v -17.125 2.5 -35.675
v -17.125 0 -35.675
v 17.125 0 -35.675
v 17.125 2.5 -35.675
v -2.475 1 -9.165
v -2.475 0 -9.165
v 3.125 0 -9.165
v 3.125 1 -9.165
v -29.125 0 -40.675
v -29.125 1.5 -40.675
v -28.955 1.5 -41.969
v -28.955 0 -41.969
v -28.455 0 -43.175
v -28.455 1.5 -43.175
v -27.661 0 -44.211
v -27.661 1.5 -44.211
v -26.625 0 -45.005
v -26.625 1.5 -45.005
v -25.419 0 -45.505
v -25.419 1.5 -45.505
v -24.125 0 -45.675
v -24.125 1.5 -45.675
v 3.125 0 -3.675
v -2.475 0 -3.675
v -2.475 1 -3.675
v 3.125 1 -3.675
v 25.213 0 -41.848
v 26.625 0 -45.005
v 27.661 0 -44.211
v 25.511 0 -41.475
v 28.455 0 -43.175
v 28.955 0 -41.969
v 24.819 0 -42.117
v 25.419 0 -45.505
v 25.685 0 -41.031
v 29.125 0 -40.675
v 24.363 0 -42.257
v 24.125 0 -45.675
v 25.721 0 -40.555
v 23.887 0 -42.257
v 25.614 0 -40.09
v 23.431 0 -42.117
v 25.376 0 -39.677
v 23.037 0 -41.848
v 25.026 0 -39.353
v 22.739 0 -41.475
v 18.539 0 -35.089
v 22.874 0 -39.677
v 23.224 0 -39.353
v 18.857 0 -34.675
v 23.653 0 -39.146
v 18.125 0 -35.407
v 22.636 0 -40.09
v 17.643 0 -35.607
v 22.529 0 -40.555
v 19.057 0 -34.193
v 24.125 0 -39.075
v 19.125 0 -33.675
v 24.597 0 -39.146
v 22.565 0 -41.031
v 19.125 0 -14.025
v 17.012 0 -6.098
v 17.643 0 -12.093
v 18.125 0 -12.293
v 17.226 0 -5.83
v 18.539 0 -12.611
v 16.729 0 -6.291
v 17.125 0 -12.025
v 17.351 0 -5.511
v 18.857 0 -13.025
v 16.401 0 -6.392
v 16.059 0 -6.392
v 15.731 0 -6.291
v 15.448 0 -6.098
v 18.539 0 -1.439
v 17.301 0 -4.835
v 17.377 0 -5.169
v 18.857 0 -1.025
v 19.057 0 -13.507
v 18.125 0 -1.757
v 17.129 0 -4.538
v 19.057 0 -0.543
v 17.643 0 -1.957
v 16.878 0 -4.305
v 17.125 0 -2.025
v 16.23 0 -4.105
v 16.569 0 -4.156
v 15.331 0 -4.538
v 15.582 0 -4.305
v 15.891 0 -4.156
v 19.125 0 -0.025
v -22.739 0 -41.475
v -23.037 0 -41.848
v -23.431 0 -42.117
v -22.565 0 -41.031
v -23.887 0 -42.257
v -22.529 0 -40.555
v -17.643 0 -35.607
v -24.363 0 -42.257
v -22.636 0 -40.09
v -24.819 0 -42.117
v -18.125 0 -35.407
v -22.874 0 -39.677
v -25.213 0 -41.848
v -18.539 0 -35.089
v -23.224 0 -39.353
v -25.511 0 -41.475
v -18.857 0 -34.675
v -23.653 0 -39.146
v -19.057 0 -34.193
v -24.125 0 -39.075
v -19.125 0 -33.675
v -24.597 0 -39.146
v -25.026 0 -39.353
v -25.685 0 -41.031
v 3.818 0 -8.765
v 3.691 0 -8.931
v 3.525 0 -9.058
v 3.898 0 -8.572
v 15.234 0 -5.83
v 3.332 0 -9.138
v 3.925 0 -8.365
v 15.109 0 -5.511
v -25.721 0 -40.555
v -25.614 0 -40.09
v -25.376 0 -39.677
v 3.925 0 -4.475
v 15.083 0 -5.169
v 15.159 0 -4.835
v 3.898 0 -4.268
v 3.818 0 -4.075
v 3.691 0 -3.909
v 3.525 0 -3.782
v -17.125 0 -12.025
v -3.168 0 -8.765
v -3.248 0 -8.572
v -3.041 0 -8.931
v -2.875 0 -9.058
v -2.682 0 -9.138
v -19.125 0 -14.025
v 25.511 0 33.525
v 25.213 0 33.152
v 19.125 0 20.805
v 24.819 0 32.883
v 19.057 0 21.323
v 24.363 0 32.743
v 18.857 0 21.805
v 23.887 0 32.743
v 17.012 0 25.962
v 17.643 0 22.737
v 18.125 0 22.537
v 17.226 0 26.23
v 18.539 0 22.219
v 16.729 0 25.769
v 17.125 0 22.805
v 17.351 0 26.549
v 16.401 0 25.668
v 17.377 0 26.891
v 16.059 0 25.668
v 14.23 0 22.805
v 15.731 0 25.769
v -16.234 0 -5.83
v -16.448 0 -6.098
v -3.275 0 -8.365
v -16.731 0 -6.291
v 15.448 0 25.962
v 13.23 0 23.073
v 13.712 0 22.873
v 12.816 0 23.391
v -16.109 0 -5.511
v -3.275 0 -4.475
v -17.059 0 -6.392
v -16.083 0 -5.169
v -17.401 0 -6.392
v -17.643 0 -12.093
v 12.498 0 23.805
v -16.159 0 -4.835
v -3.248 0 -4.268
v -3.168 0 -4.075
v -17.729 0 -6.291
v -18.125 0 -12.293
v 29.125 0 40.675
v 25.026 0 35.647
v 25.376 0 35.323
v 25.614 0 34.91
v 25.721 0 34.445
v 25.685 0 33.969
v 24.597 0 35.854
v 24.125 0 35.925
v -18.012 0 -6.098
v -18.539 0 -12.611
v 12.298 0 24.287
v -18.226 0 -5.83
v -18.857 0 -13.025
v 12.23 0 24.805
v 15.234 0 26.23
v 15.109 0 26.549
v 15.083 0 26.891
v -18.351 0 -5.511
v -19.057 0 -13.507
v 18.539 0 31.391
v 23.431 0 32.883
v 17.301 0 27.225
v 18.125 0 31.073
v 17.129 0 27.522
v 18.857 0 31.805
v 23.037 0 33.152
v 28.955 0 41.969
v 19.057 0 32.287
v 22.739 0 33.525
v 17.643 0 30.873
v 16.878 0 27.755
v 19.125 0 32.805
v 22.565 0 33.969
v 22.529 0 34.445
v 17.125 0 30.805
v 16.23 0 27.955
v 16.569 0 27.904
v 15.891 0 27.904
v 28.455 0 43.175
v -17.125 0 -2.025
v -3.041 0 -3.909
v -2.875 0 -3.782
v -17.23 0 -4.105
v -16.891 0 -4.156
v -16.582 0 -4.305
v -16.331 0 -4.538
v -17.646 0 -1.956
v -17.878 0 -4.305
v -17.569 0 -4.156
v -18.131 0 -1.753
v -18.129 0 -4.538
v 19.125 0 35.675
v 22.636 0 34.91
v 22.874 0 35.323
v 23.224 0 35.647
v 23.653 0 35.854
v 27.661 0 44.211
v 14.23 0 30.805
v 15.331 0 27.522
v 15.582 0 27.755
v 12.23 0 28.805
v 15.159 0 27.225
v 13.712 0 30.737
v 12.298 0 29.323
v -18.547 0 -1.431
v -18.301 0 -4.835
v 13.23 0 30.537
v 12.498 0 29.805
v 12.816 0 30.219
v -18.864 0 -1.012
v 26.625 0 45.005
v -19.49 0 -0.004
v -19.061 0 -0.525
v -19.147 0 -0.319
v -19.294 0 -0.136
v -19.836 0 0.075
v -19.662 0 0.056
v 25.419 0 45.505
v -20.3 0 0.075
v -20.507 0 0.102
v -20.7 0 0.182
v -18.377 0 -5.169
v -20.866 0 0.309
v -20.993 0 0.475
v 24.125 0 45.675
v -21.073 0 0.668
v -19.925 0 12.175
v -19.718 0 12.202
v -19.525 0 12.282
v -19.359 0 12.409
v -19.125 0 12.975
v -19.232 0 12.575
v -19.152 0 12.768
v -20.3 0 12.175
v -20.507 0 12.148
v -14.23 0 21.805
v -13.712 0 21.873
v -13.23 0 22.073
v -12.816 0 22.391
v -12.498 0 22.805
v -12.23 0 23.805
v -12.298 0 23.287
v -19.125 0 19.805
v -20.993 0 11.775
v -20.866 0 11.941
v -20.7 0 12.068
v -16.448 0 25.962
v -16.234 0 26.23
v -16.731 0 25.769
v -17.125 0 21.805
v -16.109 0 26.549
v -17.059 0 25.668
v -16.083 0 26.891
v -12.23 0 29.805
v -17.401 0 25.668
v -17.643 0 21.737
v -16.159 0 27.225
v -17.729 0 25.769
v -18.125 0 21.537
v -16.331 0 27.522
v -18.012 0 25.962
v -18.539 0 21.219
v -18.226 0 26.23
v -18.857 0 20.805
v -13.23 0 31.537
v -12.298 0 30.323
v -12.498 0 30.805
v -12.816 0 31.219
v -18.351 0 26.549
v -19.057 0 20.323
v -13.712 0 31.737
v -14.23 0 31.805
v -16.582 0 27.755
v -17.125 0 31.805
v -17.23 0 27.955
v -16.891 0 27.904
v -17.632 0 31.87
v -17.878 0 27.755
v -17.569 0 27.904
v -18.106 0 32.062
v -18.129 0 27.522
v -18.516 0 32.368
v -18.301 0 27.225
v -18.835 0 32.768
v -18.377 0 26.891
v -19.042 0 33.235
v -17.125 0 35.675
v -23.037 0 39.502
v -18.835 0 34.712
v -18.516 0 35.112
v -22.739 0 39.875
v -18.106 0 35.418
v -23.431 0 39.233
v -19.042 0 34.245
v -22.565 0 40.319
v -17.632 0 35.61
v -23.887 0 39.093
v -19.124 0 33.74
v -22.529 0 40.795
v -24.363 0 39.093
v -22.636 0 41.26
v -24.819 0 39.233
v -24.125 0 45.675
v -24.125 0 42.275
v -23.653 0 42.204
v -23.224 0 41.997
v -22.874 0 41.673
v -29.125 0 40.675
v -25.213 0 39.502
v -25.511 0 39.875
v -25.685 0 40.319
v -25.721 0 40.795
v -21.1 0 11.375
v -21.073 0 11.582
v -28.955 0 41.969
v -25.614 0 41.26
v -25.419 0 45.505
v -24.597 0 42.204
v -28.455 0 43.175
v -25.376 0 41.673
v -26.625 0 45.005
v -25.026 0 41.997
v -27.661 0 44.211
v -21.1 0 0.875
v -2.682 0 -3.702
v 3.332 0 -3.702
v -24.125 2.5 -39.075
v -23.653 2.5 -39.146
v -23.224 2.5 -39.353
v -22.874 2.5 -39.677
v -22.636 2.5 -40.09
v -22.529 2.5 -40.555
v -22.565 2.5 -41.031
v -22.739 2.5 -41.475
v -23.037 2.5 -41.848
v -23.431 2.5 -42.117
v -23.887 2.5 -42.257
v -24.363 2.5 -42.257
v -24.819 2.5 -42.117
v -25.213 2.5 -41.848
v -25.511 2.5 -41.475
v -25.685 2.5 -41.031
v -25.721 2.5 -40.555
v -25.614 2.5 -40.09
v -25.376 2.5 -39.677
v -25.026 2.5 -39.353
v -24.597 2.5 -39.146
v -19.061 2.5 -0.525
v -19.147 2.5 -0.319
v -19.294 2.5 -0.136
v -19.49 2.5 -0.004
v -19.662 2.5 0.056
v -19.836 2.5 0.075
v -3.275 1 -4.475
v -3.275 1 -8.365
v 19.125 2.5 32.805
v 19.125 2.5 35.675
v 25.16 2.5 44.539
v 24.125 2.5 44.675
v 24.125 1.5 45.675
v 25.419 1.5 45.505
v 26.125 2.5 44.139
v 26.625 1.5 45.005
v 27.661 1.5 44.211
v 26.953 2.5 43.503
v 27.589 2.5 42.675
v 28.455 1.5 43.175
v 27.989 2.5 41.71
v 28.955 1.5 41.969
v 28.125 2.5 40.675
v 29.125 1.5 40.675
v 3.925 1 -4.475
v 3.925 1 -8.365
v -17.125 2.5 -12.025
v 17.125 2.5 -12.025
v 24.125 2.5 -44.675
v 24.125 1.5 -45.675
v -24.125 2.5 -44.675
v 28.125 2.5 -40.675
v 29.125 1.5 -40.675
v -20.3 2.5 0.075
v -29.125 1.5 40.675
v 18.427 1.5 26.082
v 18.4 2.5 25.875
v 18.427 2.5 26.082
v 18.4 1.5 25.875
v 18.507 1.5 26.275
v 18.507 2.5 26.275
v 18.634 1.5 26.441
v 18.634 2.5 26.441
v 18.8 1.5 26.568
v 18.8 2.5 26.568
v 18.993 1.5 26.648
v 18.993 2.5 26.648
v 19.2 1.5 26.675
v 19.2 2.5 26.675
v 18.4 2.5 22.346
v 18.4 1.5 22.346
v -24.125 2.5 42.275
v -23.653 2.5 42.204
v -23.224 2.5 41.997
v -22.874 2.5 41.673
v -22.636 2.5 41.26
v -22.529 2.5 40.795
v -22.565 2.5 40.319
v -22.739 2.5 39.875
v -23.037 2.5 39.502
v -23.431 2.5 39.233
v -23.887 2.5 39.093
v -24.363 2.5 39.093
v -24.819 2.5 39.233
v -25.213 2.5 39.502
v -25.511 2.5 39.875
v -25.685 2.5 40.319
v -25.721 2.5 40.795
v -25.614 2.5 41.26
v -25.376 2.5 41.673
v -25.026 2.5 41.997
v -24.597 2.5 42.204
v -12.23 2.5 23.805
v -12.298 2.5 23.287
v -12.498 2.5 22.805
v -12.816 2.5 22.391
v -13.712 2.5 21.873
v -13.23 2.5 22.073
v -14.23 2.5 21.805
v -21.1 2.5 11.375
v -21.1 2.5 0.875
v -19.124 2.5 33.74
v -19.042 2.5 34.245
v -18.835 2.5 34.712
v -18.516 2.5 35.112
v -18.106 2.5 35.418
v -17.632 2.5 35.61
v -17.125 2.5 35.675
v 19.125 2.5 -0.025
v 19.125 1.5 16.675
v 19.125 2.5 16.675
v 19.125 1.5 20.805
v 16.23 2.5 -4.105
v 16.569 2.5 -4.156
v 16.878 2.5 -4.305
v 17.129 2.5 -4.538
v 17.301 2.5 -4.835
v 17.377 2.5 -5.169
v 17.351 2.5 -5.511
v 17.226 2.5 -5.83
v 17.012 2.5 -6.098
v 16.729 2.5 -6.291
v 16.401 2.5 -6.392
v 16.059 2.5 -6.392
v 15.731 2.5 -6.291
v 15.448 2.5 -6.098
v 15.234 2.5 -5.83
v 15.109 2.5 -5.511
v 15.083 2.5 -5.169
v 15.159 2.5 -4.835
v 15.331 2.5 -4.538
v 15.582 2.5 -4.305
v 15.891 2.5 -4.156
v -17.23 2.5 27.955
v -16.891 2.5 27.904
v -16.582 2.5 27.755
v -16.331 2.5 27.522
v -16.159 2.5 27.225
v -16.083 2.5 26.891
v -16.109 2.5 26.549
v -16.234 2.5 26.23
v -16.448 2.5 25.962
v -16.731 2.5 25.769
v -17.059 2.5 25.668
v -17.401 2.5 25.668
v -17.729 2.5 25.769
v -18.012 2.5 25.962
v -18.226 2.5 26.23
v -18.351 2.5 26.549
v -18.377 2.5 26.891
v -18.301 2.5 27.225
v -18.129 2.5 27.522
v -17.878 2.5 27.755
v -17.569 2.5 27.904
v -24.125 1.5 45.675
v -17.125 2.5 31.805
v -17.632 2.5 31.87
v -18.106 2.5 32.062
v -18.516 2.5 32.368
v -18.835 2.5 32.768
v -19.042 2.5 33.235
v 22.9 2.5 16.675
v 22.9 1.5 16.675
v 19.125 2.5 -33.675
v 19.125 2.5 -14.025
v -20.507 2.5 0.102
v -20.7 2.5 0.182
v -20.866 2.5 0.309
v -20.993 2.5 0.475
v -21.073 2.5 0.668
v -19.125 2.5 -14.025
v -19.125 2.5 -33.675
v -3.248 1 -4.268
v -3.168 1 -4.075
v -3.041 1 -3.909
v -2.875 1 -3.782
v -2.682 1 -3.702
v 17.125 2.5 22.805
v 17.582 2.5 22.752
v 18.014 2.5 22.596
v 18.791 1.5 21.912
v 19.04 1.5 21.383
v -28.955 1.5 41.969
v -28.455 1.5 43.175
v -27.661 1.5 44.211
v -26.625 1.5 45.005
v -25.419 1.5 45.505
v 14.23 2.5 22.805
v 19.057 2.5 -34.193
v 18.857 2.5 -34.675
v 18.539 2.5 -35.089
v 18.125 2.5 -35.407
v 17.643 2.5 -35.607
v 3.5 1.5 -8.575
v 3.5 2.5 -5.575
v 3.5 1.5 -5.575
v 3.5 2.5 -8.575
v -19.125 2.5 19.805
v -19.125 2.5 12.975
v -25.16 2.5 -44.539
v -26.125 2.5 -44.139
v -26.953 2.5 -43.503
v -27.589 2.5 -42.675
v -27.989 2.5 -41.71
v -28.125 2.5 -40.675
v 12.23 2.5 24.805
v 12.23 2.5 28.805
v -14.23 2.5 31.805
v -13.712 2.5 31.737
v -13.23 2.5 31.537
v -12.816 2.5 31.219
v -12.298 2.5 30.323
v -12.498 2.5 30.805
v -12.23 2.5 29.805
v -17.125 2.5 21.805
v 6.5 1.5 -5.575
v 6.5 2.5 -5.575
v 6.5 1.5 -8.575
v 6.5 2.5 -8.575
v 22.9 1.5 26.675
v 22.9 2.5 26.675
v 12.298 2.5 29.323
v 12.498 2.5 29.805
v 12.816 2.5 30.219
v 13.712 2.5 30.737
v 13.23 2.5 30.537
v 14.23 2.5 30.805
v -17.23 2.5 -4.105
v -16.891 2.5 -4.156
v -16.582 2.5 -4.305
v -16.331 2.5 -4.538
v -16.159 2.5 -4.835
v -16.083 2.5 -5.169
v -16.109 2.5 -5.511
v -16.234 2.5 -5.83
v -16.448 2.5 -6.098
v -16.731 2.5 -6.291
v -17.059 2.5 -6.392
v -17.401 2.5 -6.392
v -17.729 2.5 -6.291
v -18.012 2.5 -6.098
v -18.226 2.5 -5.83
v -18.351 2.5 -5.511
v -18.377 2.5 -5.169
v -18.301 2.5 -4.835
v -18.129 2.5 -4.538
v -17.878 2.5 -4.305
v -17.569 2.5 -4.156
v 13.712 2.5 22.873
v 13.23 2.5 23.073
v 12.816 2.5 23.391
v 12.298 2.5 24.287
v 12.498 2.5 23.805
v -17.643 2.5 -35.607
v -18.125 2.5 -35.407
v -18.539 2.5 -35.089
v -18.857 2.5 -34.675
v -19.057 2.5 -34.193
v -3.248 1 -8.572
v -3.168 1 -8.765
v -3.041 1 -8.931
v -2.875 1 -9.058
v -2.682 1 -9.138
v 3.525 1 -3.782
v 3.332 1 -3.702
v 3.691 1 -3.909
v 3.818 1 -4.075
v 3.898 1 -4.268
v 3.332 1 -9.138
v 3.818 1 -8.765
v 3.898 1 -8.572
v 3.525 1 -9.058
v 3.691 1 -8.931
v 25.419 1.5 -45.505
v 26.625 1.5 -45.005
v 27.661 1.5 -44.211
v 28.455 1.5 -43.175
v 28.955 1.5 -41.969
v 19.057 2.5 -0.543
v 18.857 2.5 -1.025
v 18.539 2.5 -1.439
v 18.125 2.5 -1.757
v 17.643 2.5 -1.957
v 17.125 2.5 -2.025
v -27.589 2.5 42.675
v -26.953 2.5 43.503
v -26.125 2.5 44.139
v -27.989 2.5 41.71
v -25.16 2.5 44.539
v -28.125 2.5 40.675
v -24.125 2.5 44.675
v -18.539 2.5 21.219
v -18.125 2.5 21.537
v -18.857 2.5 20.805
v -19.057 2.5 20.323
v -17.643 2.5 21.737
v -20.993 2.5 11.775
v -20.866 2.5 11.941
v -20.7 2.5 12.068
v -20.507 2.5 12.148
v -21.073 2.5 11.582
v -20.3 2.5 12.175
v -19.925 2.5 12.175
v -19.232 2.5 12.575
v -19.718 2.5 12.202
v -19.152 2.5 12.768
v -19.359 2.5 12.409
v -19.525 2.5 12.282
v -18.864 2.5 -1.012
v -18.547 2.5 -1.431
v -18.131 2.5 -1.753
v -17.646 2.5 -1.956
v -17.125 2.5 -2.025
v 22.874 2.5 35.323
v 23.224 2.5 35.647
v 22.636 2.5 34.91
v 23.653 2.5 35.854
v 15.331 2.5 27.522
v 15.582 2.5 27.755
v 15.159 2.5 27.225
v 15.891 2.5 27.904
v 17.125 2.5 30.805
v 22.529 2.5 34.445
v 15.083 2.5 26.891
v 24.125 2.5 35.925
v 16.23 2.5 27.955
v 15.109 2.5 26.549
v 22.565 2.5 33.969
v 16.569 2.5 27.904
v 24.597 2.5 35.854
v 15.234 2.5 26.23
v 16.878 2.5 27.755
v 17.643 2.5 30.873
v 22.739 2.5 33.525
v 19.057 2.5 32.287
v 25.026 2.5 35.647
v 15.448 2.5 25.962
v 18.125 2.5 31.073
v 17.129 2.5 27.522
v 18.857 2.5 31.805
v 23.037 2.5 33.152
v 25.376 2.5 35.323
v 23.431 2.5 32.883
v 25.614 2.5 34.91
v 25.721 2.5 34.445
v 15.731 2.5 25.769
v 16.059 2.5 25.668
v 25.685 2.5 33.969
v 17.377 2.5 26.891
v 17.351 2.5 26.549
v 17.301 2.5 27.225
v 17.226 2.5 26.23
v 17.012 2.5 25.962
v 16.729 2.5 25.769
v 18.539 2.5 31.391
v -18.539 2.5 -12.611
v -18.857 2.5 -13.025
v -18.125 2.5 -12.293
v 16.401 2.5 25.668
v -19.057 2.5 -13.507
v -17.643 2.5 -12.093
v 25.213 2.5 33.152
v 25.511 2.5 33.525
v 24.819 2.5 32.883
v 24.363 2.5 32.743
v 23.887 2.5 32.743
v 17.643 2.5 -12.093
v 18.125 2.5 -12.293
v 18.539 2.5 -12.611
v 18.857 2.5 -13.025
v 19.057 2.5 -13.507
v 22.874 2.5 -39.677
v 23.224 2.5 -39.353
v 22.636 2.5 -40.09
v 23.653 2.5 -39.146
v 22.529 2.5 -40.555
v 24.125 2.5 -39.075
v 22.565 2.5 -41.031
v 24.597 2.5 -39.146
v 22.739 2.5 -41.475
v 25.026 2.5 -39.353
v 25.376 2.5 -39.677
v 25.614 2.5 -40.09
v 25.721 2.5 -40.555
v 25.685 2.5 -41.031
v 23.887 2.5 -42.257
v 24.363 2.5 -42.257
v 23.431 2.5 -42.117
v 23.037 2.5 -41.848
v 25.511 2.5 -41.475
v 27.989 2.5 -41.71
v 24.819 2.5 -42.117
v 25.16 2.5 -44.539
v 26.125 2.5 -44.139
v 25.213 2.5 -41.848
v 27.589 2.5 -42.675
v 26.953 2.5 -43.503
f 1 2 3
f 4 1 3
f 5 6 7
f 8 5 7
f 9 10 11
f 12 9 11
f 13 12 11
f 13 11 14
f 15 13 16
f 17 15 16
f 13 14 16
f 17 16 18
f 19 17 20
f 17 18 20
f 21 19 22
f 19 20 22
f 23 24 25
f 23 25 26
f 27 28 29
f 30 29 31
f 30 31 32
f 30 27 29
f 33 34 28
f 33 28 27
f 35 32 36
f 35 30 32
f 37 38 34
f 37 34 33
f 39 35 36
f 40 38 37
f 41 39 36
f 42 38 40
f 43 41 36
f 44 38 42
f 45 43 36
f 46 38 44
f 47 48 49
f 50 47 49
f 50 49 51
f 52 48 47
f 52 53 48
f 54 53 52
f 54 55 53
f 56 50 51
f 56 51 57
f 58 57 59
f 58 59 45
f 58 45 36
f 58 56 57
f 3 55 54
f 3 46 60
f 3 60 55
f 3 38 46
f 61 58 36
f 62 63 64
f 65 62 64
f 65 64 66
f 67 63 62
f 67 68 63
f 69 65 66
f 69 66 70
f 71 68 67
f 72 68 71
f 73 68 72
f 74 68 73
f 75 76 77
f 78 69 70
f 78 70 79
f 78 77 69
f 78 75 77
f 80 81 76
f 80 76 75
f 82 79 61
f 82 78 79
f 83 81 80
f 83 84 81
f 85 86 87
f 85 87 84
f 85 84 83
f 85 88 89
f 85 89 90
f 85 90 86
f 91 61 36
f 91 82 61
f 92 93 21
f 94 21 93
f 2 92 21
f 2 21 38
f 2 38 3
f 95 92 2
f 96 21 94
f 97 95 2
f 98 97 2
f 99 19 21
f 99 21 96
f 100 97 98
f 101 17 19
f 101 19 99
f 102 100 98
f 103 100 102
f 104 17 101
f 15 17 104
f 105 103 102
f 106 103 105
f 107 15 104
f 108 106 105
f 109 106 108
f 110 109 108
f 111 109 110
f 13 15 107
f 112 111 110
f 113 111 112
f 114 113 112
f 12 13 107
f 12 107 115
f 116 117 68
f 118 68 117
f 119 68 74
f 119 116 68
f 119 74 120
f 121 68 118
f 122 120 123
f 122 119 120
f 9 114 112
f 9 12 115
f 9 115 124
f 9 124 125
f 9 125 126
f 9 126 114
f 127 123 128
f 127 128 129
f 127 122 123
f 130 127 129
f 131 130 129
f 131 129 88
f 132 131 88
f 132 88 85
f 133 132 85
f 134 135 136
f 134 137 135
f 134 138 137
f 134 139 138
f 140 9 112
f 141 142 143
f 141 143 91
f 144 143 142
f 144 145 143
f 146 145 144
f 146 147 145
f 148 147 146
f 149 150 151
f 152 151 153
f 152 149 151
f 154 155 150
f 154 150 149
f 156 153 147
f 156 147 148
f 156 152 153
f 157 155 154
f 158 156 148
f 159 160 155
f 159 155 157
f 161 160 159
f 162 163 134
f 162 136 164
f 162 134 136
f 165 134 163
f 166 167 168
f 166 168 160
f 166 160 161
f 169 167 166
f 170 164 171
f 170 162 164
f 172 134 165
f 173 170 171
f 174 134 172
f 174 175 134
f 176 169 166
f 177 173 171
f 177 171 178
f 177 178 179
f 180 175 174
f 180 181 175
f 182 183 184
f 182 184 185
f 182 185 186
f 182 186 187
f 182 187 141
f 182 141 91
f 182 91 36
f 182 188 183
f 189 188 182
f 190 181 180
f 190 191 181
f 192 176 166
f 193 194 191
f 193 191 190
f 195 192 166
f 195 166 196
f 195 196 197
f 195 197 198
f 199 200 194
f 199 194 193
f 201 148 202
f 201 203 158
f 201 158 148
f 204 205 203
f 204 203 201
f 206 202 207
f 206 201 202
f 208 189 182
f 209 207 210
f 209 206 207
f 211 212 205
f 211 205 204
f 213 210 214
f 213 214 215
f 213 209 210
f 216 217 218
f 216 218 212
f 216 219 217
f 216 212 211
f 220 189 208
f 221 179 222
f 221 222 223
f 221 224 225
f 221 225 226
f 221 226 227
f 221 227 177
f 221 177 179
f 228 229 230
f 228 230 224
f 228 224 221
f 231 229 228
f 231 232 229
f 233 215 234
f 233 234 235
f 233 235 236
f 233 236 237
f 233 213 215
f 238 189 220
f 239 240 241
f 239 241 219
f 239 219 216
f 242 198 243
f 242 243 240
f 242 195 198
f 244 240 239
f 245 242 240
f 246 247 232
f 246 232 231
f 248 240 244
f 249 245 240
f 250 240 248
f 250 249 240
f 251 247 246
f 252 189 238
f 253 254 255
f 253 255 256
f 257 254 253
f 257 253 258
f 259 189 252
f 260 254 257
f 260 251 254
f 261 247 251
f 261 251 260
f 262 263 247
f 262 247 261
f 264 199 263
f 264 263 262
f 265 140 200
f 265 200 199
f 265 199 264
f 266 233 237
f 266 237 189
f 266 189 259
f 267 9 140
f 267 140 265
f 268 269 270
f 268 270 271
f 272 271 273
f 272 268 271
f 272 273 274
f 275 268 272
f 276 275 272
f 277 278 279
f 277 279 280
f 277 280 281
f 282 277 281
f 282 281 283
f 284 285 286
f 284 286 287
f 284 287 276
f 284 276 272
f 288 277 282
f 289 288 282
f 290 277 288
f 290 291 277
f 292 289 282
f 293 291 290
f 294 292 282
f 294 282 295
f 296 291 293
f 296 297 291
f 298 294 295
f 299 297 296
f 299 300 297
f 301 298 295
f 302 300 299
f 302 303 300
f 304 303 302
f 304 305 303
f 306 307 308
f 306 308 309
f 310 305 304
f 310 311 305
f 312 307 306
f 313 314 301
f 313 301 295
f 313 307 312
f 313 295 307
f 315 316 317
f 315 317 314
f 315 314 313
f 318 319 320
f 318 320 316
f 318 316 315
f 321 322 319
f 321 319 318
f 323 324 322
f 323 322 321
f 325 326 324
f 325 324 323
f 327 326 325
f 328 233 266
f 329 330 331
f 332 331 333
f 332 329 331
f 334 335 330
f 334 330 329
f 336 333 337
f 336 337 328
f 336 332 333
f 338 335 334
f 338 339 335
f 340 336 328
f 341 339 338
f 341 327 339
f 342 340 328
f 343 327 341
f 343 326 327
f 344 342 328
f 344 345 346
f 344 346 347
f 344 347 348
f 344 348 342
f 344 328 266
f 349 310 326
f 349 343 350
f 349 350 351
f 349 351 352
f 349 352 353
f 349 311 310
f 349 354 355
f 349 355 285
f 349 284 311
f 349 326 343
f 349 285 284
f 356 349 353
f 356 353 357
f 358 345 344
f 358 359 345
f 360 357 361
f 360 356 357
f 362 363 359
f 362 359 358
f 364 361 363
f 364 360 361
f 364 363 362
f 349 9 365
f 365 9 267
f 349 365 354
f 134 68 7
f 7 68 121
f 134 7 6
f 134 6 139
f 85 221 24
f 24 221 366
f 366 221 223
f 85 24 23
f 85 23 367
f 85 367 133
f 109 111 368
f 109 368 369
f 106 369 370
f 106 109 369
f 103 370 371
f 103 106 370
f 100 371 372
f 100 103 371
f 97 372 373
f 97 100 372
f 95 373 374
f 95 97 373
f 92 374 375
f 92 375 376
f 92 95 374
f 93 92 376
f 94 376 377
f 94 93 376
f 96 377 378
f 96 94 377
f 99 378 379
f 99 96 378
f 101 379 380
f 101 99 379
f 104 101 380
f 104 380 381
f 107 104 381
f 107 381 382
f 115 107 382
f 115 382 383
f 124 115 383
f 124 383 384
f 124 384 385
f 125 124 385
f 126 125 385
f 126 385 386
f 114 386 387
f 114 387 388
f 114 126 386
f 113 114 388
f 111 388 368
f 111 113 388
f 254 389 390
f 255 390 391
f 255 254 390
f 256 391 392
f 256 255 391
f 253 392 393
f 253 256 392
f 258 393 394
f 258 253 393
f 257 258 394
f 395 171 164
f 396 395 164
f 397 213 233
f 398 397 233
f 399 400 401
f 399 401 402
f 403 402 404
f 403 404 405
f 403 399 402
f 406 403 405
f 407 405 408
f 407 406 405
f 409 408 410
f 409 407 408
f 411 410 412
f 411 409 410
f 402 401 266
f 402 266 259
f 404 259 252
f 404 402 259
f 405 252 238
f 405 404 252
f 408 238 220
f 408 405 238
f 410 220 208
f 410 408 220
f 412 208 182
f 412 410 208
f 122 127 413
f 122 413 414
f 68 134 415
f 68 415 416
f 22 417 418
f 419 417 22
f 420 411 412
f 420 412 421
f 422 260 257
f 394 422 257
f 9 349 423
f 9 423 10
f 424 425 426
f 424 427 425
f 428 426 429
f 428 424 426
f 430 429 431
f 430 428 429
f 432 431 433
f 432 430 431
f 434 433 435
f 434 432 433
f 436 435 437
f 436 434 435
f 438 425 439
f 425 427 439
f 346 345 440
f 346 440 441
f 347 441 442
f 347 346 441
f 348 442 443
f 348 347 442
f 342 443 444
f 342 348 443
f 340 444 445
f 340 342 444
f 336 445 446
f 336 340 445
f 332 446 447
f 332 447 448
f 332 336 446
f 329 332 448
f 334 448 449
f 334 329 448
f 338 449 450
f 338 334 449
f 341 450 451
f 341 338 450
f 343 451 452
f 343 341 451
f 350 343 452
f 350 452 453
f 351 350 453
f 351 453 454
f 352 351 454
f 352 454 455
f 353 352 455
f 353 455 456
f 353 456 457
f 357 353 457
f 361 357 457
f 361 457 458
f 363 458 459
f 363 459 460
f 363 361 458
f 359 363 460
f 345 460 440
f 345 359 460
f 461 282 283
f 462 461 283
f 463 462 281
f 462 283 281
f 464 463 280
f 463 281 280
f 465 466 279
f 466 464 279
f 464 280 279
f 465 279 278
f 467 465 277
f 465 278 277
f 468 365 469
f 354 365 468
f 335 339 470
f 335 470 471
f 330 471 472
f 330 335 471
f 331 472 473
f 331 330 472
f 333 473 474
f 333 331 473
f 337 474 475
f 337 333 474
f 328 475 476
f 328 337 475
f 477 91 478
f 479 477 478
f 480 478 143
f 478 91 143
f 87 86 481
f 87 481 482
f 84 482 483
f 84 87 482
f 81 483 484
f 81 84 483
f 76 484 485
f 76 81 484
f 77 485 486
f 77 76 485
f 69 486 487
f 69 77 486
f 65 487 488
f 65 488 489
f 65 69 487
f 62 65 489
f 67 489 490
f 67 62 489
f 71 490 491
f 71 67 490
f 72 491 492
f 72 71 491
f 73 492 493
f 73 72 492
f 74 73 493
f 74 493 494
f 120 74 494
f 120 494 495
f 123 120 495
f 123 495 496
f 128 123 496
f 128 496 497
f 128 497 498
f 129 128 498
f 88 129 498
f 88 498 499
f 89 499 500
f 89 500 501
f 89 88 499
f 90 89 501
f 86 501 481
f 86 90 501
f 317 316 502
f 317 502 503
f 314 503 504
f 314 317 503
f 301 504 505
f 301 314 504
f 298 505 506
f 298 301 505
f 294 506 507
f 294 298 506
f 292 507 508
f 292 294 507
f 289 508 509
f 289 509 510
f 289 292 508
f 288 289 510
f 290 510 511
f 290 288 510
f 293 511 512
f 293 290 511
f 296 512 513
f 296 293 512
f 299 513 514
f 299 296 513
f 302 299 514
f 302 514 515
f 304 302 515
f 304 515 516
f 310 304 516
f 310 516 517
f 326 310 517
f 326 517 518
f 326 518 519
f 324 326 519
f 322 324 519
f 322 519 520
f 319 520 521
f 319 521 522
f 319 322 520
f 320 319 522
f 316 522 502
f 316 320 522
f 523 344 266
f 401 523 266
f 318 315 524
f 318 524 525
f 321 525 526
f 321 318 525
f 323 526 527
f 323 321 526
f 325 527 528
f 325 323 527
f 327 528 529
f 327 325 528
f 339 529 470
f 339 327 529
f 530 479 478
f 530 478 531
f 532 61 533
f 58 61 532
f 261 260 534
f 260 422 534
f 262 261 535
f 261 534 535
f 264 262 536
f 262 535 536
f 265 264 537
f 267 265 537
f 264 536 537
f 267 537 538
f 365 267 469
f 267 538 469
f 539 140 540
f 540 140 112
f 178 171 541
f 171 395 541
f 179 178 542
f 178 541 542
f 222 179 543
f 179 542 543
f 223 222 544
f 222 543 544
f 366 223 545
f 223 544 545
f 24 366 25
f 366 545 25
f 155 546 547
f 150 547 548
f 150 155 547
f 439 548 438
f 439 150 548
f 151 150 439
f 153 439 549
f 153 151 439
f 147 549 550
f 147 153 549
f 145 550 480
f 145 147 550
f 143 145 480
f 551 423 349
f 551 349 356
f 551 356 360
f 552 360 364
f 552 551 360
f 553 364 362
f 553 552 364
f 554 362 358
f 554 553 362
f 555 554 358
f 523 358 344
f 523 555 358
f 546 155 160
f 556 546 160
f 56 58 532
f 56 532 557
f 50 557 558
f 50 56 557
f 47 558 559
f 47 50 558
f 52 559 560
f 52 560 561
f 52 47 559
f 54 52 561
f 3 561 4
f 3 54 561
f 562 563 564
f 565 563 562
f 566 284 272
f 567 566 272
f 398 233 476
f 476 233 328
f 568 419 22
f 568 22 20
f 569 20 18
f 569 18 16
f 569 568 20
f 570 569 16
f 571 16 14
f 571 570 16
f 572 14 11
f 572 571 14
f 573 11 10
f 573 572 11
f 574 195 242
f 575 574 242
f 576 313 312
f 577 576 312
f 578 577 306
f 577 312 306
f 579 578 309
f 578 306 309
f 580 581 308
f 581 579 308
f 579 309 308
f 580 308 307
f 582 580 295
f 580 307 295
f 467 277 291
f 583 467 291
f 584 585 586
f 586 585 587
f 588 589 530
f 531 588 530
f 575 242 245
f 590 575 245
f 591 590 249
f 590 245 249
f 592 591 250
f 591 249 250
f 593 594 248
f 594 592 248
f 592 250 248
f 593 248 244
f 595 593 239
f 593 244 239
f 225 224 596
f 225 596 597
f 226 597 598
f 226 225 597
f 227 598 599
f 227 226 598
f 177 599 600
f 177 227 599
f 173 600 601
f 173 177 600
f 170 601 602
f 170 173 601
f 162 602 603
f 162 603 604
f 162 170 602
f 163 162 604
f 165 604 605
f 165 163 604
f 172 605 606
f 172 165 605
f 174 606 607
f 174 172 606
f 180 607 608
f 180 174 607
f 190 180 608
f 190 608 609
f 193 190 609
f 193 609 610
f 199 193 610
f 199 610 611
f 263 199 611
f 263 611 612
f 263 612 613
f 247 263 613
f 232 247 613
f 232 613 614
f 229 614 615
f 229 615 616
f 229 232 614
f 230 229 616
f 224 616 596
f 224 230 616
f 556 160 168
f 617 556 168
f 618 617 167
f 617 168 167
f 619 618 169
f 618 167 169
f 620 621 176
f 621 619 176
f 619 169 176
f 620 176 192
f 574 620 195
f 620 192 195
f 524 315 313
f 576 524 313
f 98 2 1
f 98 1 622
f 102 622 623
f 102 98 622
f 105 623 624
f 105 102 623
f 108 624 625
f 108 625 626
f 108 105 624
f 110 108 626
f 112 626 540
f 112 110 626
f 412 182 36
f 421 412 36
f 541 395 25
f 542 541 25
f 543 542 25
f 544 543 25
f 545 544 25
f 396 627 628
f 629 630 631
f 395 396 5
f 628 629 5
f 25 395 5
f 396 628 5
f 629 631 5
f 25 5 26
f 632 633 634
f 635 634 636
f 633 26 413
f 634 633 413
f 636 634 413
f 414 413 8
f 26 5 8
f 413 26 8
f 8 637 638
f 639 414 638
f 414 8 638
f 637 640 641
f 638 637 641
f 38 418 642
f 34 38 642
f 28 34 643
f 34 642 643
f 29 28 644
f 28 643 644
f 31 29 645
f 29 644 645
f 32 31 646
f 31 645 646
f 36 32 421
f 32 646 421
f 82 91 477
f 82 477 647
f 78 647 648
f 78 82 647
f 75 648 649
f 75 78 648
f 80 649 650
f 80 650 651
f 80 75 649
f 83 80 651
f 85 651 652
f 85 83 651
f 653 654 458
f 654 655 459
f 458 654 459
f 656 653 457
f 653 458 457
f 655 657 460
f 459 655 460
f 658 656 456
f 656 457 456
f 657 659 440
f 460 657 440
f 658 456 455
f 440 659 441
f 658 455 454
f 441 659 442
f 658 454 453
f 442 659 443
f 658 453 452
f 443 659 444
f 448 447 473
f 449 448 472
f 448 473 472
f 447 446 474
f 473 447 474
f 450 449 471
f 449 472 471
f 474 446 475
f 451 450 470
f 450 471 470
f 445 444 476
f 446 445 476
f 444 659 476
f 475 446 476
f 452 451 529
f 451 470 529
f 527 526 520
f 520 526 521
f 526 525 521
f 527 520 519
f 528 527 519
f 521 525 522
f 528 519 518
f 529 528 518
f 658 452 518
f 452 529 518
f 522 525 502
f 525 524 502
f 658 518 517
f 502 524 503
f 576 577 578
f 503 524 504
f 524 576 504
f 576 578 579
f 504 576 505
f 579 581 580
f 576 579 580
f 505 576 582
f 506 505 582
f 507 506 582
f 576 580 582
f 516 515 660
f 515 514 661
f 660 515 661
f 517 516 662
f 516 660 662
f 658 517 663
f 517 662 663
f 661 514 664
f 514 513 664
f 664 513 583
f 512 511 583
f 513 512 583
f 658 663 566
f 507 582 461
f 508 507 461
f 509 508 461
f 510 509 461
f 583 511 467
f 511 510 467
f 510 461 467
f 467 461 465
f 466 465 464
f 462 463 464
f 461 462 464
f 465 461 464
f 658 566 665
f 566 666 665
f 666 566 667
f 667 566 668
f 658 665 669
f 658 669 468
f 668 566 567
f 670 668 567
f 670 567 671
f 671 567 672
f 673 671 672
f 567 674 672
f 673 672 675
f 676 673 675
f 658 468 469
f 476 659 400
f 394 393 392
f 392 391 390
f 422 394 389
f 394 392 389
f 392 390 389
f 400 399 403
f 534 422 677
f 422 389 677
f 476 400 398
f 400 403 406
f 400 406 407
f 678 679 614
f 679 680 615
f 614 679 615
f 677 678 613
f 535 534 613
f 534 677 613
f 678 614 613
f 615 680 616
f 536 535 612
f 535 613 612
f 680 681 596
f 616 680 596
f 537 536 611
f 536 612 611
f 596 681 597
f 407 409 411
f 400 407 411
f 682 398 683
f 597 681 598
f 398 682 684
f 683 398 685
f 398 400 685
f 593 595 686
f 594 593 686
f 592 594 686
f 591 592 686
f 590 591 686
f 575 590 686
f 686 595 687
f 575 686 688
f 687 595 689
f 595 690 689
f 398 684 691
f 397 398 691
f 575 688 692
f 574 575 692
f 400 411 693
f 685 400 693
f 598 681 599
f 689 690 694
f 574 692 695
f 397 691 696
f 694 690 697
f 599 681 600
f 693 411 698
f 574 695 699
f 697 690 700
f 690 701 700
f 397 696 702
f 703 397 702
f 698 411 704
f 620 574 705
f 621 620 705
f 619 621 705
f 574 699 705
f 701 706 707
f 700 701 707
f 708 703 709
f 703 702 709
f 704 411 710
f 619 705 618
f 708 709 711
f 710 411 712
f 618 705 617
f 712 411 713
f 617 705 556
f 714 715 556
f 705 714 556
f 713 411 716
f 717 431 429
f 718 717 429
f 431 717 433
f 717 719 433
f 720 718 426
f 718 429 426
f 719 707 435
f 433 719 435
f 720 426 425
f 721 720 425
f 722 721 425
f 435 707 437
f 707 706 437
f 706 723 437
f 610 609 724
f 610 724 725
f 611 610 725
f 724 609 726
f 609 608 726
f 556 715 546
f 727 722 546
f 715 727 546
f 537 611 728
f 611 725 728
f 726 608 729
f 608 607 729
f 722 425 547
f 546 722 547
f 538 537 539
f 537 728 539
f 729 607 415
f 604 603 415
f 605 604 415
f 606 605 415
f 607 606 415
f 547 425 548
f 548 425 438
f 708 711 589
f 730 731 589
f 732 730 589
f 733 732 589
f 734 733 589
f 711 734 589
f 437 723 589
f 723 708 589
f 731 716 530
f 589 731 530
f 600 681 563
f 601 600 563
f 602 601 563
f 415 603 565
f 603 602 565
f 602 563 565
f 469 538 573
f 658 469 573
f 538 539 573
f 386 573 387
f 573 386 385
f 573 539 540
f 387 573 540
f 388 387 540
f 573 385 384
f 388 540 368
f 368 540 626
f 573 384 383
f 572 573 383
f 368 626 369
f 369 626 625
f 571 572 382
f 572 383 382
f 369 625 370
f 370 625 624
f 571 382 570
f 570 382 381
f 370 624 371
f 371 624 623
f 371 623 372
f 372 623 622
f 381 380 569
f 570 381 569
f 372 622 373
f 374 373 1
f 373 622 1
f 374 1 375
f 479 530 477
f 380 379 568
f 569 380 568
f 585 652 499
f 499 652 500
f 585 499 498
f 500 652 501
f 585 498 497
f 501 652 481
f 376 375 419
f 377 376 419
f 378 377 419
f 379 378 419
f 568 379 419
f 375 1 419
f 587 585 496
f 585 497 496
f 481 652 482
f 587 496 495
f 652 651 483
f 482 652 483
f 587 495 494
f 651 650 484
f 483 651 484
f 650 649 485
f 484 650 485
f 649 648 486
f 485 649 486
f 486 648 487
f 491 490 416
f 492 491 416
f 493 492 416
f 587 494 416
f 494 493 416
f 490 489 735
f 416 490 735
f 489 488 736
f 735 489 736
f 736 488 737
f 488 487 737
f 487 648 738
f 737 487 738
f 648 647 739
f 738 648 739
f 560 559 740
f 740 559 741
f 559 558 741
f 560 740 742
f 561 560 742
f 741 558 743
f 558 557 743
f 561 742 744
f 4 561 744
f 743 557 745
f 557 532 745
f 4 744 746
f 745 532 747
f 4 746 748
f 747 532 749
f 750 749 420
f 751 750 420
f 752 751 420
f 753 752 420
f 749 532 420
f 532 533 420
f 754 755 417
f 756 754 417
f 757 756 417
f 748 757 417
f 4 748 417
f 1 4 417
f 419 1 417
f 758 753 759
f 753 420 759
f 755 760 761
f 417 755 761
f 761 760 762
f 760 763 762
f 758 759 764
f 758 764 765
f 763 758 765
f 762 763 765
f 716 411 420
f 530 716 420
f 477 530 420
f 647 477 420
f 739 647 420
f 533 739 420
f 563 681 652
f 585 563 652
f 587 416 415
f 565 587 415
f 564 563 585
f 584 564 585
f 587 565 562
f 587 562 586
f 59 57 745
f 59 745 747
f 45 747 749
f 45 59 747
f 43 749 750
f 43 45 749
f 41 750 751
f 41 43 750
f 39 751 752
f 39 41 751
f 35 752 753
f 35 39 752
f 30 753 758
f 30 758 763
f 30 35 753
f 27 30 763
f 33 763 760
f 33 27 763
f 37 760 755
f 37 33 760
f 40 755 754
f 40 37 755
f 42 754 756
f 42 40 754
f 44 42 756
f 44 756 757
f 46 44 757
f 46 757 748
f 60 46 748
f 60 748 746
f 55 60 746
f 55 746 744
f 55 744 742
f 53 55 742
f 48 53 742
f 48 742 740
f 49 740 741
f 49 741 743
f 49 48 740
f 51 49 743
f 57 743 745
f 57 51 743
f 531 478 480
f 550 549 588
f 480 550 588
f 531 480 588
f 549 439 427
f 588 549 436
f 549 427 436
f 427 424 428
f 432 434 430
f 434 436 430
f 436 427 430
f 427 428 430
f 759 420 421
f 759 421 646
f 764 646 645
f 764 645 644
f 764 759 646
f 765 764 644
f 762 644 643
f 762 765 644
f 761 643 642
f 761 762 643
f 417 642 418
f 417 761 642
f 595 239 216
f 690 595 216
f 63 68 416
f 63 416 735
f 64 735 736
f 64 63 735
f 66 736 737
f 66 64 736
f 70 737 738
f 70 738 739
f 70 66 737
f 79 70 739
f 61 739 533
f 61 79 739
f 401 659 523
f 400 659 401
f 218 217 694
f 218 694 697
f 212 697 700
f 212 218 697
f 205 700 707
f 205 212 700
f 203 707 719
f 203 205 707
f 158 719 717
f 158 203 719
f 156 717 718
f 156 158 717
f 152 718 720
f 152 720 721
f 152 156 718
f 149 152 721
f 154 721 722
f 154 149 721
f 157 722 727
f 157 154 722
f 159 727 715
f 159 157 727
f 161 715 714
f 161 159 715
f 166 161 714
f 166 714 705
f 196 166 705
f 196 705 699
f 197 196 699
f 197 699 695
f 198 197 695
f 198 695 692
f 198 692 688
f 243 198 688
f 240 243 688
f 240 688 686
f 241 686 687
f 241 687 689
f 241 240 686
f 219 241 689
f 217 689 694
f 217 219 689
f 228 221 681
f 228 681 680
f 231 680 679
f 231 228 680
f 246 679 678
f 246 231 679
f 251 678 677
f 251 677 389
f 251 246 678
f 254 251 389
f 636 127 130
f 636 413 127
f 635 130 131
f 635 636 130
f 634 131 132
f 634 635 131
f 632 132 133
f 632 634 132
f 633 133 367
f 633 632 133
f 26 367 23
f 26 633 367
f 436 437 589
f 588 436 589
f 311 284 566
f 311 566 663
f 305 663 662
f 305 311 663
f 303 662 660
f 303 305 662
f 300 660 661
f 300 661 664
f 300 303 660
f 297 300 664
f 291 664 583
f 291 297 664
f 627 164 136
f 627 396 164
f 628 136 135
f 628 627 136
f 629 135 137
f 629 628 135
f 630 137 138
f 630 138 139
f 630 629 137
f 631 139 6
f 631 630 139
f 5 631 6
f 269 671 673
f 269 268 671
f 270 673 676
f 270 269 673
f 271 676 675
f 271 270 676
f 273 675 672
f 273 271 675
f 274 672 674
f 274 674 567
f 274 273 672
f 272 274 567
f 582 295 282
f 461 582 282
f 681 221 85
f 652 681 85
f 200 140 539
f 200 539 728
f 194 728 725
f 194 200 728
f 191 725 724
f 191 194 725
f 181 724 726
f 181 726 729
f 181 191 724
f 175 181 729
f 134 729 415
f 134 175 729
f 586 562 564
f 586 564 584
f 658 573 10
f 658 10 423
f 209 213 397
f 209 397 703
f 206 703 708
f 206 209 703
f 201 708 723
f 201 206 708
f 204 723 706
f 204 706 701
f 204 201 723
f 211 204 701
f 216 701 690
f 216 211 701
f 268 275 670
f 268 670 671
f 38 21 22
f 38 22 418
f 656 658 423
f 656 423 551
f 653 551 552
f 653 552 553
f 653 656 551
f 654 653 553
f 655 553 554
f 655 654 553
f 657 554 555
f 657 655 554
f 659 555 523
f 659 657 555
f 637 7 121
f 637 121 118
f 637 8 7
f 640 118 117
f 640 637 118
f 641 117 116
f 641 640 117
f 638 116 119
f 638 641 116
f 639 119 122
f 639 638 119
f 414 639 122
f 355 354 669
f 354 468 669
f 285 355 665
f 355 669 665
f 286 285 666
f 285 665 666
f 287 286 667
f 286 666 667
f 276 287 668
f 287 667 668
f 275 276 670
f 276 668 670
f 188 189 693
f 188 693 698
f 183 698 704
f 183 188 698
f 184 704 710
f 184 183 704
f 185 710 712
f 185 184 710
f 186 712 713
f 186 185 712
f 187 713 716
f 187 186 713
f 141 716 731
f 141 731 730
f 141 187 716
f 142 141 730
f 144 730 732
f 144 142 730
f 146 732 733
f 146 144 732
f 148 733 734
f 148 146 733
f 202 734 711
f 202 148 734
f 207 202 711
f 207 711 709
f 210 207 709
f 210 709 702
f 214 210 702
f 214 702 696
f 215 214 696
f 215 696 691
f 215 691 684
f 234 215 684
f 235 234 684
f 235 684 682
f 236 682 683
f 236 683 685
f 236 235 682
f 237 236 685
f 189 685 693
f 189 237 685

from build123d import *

# Parameters (mm, degrees)
SKETCH5_W           = 58.25
SKETCH5_H           = 91.35
SKETCH5_R           = 1.15
SKETCH5_R_2         = 1.6
SKETCH5_W_2         = 38.25
SKETCH5_H_2         = 23.65
BOSS_EXTRUDE1_DEPTH = 2.5
SKETCH8_W           = 4.5
SKETCH8_H           = 10
SKETCH8_W_2         = 3
SKETCH8_H_2         = 3
CUT_EXTRUDE1_DEPTH  = 1
FILLET1_R           = 2
FILLET2_R           = 5
SKETCH9_W           = 6.8
SKETCH9_H           = 12.1
CUT_EXTRUDE2_DEPTH  = 55.228417366
SKETCH10_W          = 7.2
SKETCH10_H          = 5.49
CUT_EXTRUDE3_DEPTH  = 1
FILLET3_R           = 0.8
CHAMFER3_SIZE       = 1


with BuildPart() as part:
    # Sketch5 → Boss-Extrude1 (new body)
    with BuildSketch(Plane(origin=(0, 0, 0), x_dir=(1, 0, 0), z_dir=(0, 1, 0))):
        Rectangle(SKETCH5_W, SKETCH5_H)
        with Locations(Location((-17.23, 5.255, 0), (0, 0, 270))):
            Circle(SKETCH5_R, mode=Mode.SUBTRACT)
        with Locations(Location((-24.125, 40.675, 0), (0, 0, 270))):
            Circle(SKETCH5_R_2, mode=Mode.SUBTRACT)
        with Locations(Location((-24.125, -40.675, 0), (0, 0, 270))):
            Circle(SKETCH5_R_2, mode=Mode.SUBTRACT)
        with Locations(Location((24.125, -34.325, 0), (0, 0, 270))):
            Circle(SKETCH5_R_2, mode=Mode.SUBTRACT)
        with Locations(Location((24.125, 40.675, 0), (0, 0, 270))):
            Circle(SKETCH5_R_2, mode=Mode.SUBTRACT)
        with Locations(Location((16.23, 5.255, 0), (0, 0, 270))):
            Circle(SKETCH5_R, mode=Mode.SUBTRACT)
        with Locations(Location((16.23, -26.805, 0), (0, 0, 270))):
            Circle(SKETCH5_R, mode=Mode.SUBTRACT)
        with Locations(Location((-17.23, -26.805, 0), (0, 0, 270))):
            Circle(SKETCH5_R, mode=Mode.SUBTRACT)
        Polygon((-19.125, 2.025), (19.125, 2.025), (19.125, -22.805), (12.23, -22.805), (12.23, -30.805), (19.125, -30.805), (19.125, -35.675), (-19.125, -35.675), (-19.125, -31.805), (-12.23, -31.805), (-12.23, -21.805), (-19.125, -21.805), align=None, mode=Mode.SUBTRACT)
        with Locations((0, 23.85)):
            Rectangle(SKETCH5_W_2, SKETCH5_H_2, mode=Mode.SUBTRACT)
    extrude(amount=BOSS_EXTRUDE1_DEPTH)

    # Sketch8 → Cut-Extrude1 (cut)
    with BuildSketch(Plane(origin=(0, 2.5, 0), x_dir=(1, 0, 0), z_dir=(0, 1, 0))):
        with Locations((20.65, -21.675)):
            Rectangle(SKETCH8_W, SKETCH8_H)
        with Locations((5, 7.075)):
            Rectangle(SKETCH8_W_2, SKETCH8_H_2)
    extrude(amount=-CUT_EXTRUDE1_DEPTH, mode=Mode.SUBTRACT)

    # Fillet1
    # the kernel refuses this fillet: 2 mm, written as the material it adds along each edge
    with BuildSketch(Plane(origin=(19.125, 0, -12.025), x_dir=(0, 0, -1), z_dir=(0, 1, 0)), Plane(origin=(19.125, 0, -35.675), x_dir=(-1, 0, 0), z_dir=(0, 1, 0)), Plane(origin=(-19.125, 0, -35.675), x_dir=(0, 0, 1), z_dir=(0, 1, 0)), Plane(origin=(19.125, 0, -2.025), x_dir=(-1, 0, 0), z_dir=(0, 1, 0)), Plane(origin=(-19.125, 0, 21.805), x_dir=(1, 0, 0), z_dir=(0, 1, 0)), Plane(origin=(19.125, 0, 30.805), x_dir=(-1, 0, 0), z_dir=(0, 1, 0)), Plane(origin=(-19.125, 0, 31.805), x_dir=(0, 0, 1), z_dir=(0, 1, 0)), Plane(origin=(-19.125, 0, 35.675), x_dir=(1, 0, 0), z_dir=(0, 1, 0))) as fillet1_piece_1:
        with BuildLine():
            CenterArc((FILLET1_R, FILLET1_R), FILLET1_R, 180, 90)
            Line((0, FILLET1_R), (0, 0))
            Line((0, 0), (FILLET1_R, 0))
        make_face()
    extrude(amount=2.5)
    with BuildSketch(Plane(origin=(-19.125, 0, -12.025), x_dir=(0, 0, -1), z_dir=(0, 1, 0)), Plane(origin=(-19.125, 0, -2.025), x_dir=(1, 0, 0), z_dir=(0, 1, 0))) as fillet1_piece_2:
        with BuildLine():
            CenterArc((FILLET1_R, -FILLET1_R), FILLET1_R, 90, 90)
            Line((0, -FILLET1_R), (0, 0))
            Line((0, 0), (FILLET1_R, 0))
        make_face()
    extrude(amount=2.5)
    with BuildSketch(Plane(origin=(19.125, 0, 22.805), x_dir=(0, 0, -1), z_dir=(0, 1, 0))) as fillet1_piece_3_section:
        with BuildLine():
            CenterArc((FILLET1_R, FILLET1_R), FILLET1_R, 180, 90)
            Line((0, FILLET1_R), (0, 0))
            Line((0, 0), (FILLET1_R, 0))
        make_face()
    fillet1_piece_3 = extrude(amount=1.5, mode=Mode.PRIVATE)
    fillet1_piece_3 = split(fillet1_piece_3, bisect_by=Plane(origin=(18.4, 0.75, 22.246257115), z_dir=(1, 0, 0)), keep=Keep.TOP, mode=Mode.PRIVATE)
    add(fillet1_piece_3)
    with BuildSketch(Plane(origin=(19.125, 0, 22.805), x_dir=(0, 0, -1), z_dir=(0, 1, 0))) as fillet1_piece_4_section:
        with BuildLine():
            CenterArc((FILLET1_R, FILLET1_R), FILLET1_R, 180, 90)
            Line((0, FILLET1_R), (0, 0))
            Line((0, 0), (FILLET1_R, 0))
        make_face()
    fillet1_piece_4 = extrude(amount=1.5, mode=Mode.PRIVATE)
    fillet1_piece_4 = split(fillet1_piece_4, bisect_by=Plane(origin=(18.4, 0.75, 22.70384679), z_dir=(-1, 0, 0)), keep=Keep.TOP, mode=Mode.PRIVATE)
    add(fillet1_piece_4)
    with BuildSketch(Plane(origin=(19.125, 0, 22.805), x_dir=(0, 0, -1), z_dir=(0, 1, 0))) as fillet1_piece_5_section:
        with BuildLine():
            CenterArc((FILLET1_R, FILLET1_R), FILLET1_R, 180, 90)
            Line((0, FILLET1_R), (0, 0))
            Line((0, 0), (FILLET1_R, 0))
        make_face()
    fillet1_piece_5 = extrude(amount=6.5, mode=Mode.PRIVATE)
    fillet1_piece_5 = split(fillet1_piece_5, bisect_by=Plane(origin=(18.018520093, 2.5, 22.70384679), z_dir=(0, -1, 0)), keep=Keep.TOP, mode=Mode.PRIVATE)
    fillet1_piece_5 = split(fillet1_piece_5, bisect_by=Plane(origin=(18.018520093, 1.5, 22.70384679), z_dir=(0, 1, 0)), keep=Keep.TOP, mode=Mode.PRIVATE)
    fillet1_piece_5 = split(fillet1_piece_5, bisect_by=Plane(origin=(18.4, 2, 22.70384679), z_dir=(-1, 0, 0)), keep=Keep.TOP, mode=Mode.PRIVATE)
    add(fillet1_piece_5)
    # the kernel refuses this fillet: 2 mm, written as the material it takes off along each edge
    with BuildSketch(Plane(origin=(12.23, -5, 30.805), x_dir=(1, 0, 0), z_dir=(0, 1, 0)), Plane(origin=(12.23, -5, 22.805), x_dir=(0, 0, 1), z_dir=(0, 1, 0)), Plane(origin=(-12.23, -5, 31.805), x_dir=(0, 0, -1), z_dir=(0, 1, 0)), Plane(origin=(-12.23, -5, 21.805), x_dir=(-1, 0, 0), z_dir=(0, 1, 0))) as fillet1_2_piece_1:
        with BuildLine():
            CenterArc((FILLET1_R, FILLET1_R), FILLET1_R, 180, 90)
            Line((0, FILLET1_R), (0, 0))
            Line((0, 0), (FILLET1_R, 0))
        make_face()
    extrude(amount=12.5, mode=Mode.SUBTRACT)

    # Fillet2
    fillet2_edges = [part.edges().sort_by_distance(p)[0] for p in [
        (29.125, 1.25, -45.675),
        (29.125, 1.25, 45.675),
        (-29.125, 1.25, 45.675),
        (-29.125, 1.25, -45.675),
    ]]
    fillet(fillet2_edges, radius=FILLET2_R)

    # Sketch9 → Cut-Extrude2 (cut, through all)
    with BuildSketch(Plane.XZ):
        with Locations((-17.7, 6.125)):
            Rectangle(SKETCH9_W, SKETCH9_H)
    extrude(amount=-CUT_EXTRUDE2_DEPTH, mode=Mode.SUBTRACT)

    # Sketch10 → Cut-Extrude3 (cut)
    with BuildSketch(Plane(origin=(0, 0, 0), x_dir=(1, 0, 0), z_dir=(0, 1, 0))):
        with Locations((0.325, 6.42)):
            Rectangle(SKETCH10_W, SKETCH10_H)
    extrude(amount=CUT_EXTRUDE3_DEPTH, mode=Mode.SUBTRACT)

    # Fillet3
    fillet3_edges = [part.edges().sort_by_distance(p)[0] for p in [
        (-19.125, 1.25, 12.175),
        (-21.1, 1.25, 12.175),
        (-19.125, 1.25, 0.075),
        (-21.1, 1.25, 0.075),
        (3.925, 0.5, -3.675),
        (3.925, 0.5, -9.165),
        (-3.275, 0.5, -9.165),
        (-3.275, 0.5, -3.675),
        (18.4, 2, 26.675),
    ]]
    fillet(fillet3_edges, radius=FILLET3_R)

    # Chamfer3
    chamfer3_edges = [part.edges().sort_by_distance(p)[0] for p in [
        (29.125, 2.5, 0),
        (0, 2.5, 45.675),
        (0, 2.5, -45.675),
        (-29.125, 2.5, 0),
        (27.660533906, 2.5, -44.210533906),
        (-27.660533906, 2.5, -44.210533906),
        (-27.660533906, 2.5, 44.210533906),
        (27.660533906, 2.5, 44.210533906),
    ]]
    chamfer(chamfer3_edges, length=CHAMFER3_SIZE)


solid = part.part
